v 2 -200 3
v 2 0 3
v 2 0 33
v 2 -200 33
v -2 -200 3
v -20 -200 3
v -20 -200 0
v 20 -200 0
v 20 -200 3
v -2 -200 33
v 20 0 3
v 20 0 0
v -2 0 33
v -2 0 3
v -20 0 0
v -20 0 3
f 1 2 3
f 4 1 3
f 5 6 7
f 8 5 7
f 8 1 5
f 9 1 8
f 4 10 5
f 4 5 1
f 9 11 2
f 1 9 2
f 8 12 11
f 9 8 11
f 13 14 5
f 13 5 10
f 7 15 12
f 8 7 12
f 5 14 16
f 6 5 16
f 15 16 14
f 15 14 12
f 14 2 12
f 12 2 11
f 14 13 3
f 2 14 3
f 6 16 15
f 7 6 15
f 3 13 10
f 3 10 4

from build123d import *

# Parameters (mm, degrees)
F0_W     = 4
F0_H     = 30
F1_DEPTH = 200


with BuildPart() as f1:
    # F0 (on Front) → F1 (new body)
    with BuildSketch(Plane.XZ):
        with Locations((0, 18)):
            Rectangle(F0_W, F0_H)
        Polygon((-2, 3), (-20, 3), (-20, 0), (20, 0), (20, 3), (2, 3), align=None)
    extrude(amount=F1_DEPTH)


solid = f1.part
